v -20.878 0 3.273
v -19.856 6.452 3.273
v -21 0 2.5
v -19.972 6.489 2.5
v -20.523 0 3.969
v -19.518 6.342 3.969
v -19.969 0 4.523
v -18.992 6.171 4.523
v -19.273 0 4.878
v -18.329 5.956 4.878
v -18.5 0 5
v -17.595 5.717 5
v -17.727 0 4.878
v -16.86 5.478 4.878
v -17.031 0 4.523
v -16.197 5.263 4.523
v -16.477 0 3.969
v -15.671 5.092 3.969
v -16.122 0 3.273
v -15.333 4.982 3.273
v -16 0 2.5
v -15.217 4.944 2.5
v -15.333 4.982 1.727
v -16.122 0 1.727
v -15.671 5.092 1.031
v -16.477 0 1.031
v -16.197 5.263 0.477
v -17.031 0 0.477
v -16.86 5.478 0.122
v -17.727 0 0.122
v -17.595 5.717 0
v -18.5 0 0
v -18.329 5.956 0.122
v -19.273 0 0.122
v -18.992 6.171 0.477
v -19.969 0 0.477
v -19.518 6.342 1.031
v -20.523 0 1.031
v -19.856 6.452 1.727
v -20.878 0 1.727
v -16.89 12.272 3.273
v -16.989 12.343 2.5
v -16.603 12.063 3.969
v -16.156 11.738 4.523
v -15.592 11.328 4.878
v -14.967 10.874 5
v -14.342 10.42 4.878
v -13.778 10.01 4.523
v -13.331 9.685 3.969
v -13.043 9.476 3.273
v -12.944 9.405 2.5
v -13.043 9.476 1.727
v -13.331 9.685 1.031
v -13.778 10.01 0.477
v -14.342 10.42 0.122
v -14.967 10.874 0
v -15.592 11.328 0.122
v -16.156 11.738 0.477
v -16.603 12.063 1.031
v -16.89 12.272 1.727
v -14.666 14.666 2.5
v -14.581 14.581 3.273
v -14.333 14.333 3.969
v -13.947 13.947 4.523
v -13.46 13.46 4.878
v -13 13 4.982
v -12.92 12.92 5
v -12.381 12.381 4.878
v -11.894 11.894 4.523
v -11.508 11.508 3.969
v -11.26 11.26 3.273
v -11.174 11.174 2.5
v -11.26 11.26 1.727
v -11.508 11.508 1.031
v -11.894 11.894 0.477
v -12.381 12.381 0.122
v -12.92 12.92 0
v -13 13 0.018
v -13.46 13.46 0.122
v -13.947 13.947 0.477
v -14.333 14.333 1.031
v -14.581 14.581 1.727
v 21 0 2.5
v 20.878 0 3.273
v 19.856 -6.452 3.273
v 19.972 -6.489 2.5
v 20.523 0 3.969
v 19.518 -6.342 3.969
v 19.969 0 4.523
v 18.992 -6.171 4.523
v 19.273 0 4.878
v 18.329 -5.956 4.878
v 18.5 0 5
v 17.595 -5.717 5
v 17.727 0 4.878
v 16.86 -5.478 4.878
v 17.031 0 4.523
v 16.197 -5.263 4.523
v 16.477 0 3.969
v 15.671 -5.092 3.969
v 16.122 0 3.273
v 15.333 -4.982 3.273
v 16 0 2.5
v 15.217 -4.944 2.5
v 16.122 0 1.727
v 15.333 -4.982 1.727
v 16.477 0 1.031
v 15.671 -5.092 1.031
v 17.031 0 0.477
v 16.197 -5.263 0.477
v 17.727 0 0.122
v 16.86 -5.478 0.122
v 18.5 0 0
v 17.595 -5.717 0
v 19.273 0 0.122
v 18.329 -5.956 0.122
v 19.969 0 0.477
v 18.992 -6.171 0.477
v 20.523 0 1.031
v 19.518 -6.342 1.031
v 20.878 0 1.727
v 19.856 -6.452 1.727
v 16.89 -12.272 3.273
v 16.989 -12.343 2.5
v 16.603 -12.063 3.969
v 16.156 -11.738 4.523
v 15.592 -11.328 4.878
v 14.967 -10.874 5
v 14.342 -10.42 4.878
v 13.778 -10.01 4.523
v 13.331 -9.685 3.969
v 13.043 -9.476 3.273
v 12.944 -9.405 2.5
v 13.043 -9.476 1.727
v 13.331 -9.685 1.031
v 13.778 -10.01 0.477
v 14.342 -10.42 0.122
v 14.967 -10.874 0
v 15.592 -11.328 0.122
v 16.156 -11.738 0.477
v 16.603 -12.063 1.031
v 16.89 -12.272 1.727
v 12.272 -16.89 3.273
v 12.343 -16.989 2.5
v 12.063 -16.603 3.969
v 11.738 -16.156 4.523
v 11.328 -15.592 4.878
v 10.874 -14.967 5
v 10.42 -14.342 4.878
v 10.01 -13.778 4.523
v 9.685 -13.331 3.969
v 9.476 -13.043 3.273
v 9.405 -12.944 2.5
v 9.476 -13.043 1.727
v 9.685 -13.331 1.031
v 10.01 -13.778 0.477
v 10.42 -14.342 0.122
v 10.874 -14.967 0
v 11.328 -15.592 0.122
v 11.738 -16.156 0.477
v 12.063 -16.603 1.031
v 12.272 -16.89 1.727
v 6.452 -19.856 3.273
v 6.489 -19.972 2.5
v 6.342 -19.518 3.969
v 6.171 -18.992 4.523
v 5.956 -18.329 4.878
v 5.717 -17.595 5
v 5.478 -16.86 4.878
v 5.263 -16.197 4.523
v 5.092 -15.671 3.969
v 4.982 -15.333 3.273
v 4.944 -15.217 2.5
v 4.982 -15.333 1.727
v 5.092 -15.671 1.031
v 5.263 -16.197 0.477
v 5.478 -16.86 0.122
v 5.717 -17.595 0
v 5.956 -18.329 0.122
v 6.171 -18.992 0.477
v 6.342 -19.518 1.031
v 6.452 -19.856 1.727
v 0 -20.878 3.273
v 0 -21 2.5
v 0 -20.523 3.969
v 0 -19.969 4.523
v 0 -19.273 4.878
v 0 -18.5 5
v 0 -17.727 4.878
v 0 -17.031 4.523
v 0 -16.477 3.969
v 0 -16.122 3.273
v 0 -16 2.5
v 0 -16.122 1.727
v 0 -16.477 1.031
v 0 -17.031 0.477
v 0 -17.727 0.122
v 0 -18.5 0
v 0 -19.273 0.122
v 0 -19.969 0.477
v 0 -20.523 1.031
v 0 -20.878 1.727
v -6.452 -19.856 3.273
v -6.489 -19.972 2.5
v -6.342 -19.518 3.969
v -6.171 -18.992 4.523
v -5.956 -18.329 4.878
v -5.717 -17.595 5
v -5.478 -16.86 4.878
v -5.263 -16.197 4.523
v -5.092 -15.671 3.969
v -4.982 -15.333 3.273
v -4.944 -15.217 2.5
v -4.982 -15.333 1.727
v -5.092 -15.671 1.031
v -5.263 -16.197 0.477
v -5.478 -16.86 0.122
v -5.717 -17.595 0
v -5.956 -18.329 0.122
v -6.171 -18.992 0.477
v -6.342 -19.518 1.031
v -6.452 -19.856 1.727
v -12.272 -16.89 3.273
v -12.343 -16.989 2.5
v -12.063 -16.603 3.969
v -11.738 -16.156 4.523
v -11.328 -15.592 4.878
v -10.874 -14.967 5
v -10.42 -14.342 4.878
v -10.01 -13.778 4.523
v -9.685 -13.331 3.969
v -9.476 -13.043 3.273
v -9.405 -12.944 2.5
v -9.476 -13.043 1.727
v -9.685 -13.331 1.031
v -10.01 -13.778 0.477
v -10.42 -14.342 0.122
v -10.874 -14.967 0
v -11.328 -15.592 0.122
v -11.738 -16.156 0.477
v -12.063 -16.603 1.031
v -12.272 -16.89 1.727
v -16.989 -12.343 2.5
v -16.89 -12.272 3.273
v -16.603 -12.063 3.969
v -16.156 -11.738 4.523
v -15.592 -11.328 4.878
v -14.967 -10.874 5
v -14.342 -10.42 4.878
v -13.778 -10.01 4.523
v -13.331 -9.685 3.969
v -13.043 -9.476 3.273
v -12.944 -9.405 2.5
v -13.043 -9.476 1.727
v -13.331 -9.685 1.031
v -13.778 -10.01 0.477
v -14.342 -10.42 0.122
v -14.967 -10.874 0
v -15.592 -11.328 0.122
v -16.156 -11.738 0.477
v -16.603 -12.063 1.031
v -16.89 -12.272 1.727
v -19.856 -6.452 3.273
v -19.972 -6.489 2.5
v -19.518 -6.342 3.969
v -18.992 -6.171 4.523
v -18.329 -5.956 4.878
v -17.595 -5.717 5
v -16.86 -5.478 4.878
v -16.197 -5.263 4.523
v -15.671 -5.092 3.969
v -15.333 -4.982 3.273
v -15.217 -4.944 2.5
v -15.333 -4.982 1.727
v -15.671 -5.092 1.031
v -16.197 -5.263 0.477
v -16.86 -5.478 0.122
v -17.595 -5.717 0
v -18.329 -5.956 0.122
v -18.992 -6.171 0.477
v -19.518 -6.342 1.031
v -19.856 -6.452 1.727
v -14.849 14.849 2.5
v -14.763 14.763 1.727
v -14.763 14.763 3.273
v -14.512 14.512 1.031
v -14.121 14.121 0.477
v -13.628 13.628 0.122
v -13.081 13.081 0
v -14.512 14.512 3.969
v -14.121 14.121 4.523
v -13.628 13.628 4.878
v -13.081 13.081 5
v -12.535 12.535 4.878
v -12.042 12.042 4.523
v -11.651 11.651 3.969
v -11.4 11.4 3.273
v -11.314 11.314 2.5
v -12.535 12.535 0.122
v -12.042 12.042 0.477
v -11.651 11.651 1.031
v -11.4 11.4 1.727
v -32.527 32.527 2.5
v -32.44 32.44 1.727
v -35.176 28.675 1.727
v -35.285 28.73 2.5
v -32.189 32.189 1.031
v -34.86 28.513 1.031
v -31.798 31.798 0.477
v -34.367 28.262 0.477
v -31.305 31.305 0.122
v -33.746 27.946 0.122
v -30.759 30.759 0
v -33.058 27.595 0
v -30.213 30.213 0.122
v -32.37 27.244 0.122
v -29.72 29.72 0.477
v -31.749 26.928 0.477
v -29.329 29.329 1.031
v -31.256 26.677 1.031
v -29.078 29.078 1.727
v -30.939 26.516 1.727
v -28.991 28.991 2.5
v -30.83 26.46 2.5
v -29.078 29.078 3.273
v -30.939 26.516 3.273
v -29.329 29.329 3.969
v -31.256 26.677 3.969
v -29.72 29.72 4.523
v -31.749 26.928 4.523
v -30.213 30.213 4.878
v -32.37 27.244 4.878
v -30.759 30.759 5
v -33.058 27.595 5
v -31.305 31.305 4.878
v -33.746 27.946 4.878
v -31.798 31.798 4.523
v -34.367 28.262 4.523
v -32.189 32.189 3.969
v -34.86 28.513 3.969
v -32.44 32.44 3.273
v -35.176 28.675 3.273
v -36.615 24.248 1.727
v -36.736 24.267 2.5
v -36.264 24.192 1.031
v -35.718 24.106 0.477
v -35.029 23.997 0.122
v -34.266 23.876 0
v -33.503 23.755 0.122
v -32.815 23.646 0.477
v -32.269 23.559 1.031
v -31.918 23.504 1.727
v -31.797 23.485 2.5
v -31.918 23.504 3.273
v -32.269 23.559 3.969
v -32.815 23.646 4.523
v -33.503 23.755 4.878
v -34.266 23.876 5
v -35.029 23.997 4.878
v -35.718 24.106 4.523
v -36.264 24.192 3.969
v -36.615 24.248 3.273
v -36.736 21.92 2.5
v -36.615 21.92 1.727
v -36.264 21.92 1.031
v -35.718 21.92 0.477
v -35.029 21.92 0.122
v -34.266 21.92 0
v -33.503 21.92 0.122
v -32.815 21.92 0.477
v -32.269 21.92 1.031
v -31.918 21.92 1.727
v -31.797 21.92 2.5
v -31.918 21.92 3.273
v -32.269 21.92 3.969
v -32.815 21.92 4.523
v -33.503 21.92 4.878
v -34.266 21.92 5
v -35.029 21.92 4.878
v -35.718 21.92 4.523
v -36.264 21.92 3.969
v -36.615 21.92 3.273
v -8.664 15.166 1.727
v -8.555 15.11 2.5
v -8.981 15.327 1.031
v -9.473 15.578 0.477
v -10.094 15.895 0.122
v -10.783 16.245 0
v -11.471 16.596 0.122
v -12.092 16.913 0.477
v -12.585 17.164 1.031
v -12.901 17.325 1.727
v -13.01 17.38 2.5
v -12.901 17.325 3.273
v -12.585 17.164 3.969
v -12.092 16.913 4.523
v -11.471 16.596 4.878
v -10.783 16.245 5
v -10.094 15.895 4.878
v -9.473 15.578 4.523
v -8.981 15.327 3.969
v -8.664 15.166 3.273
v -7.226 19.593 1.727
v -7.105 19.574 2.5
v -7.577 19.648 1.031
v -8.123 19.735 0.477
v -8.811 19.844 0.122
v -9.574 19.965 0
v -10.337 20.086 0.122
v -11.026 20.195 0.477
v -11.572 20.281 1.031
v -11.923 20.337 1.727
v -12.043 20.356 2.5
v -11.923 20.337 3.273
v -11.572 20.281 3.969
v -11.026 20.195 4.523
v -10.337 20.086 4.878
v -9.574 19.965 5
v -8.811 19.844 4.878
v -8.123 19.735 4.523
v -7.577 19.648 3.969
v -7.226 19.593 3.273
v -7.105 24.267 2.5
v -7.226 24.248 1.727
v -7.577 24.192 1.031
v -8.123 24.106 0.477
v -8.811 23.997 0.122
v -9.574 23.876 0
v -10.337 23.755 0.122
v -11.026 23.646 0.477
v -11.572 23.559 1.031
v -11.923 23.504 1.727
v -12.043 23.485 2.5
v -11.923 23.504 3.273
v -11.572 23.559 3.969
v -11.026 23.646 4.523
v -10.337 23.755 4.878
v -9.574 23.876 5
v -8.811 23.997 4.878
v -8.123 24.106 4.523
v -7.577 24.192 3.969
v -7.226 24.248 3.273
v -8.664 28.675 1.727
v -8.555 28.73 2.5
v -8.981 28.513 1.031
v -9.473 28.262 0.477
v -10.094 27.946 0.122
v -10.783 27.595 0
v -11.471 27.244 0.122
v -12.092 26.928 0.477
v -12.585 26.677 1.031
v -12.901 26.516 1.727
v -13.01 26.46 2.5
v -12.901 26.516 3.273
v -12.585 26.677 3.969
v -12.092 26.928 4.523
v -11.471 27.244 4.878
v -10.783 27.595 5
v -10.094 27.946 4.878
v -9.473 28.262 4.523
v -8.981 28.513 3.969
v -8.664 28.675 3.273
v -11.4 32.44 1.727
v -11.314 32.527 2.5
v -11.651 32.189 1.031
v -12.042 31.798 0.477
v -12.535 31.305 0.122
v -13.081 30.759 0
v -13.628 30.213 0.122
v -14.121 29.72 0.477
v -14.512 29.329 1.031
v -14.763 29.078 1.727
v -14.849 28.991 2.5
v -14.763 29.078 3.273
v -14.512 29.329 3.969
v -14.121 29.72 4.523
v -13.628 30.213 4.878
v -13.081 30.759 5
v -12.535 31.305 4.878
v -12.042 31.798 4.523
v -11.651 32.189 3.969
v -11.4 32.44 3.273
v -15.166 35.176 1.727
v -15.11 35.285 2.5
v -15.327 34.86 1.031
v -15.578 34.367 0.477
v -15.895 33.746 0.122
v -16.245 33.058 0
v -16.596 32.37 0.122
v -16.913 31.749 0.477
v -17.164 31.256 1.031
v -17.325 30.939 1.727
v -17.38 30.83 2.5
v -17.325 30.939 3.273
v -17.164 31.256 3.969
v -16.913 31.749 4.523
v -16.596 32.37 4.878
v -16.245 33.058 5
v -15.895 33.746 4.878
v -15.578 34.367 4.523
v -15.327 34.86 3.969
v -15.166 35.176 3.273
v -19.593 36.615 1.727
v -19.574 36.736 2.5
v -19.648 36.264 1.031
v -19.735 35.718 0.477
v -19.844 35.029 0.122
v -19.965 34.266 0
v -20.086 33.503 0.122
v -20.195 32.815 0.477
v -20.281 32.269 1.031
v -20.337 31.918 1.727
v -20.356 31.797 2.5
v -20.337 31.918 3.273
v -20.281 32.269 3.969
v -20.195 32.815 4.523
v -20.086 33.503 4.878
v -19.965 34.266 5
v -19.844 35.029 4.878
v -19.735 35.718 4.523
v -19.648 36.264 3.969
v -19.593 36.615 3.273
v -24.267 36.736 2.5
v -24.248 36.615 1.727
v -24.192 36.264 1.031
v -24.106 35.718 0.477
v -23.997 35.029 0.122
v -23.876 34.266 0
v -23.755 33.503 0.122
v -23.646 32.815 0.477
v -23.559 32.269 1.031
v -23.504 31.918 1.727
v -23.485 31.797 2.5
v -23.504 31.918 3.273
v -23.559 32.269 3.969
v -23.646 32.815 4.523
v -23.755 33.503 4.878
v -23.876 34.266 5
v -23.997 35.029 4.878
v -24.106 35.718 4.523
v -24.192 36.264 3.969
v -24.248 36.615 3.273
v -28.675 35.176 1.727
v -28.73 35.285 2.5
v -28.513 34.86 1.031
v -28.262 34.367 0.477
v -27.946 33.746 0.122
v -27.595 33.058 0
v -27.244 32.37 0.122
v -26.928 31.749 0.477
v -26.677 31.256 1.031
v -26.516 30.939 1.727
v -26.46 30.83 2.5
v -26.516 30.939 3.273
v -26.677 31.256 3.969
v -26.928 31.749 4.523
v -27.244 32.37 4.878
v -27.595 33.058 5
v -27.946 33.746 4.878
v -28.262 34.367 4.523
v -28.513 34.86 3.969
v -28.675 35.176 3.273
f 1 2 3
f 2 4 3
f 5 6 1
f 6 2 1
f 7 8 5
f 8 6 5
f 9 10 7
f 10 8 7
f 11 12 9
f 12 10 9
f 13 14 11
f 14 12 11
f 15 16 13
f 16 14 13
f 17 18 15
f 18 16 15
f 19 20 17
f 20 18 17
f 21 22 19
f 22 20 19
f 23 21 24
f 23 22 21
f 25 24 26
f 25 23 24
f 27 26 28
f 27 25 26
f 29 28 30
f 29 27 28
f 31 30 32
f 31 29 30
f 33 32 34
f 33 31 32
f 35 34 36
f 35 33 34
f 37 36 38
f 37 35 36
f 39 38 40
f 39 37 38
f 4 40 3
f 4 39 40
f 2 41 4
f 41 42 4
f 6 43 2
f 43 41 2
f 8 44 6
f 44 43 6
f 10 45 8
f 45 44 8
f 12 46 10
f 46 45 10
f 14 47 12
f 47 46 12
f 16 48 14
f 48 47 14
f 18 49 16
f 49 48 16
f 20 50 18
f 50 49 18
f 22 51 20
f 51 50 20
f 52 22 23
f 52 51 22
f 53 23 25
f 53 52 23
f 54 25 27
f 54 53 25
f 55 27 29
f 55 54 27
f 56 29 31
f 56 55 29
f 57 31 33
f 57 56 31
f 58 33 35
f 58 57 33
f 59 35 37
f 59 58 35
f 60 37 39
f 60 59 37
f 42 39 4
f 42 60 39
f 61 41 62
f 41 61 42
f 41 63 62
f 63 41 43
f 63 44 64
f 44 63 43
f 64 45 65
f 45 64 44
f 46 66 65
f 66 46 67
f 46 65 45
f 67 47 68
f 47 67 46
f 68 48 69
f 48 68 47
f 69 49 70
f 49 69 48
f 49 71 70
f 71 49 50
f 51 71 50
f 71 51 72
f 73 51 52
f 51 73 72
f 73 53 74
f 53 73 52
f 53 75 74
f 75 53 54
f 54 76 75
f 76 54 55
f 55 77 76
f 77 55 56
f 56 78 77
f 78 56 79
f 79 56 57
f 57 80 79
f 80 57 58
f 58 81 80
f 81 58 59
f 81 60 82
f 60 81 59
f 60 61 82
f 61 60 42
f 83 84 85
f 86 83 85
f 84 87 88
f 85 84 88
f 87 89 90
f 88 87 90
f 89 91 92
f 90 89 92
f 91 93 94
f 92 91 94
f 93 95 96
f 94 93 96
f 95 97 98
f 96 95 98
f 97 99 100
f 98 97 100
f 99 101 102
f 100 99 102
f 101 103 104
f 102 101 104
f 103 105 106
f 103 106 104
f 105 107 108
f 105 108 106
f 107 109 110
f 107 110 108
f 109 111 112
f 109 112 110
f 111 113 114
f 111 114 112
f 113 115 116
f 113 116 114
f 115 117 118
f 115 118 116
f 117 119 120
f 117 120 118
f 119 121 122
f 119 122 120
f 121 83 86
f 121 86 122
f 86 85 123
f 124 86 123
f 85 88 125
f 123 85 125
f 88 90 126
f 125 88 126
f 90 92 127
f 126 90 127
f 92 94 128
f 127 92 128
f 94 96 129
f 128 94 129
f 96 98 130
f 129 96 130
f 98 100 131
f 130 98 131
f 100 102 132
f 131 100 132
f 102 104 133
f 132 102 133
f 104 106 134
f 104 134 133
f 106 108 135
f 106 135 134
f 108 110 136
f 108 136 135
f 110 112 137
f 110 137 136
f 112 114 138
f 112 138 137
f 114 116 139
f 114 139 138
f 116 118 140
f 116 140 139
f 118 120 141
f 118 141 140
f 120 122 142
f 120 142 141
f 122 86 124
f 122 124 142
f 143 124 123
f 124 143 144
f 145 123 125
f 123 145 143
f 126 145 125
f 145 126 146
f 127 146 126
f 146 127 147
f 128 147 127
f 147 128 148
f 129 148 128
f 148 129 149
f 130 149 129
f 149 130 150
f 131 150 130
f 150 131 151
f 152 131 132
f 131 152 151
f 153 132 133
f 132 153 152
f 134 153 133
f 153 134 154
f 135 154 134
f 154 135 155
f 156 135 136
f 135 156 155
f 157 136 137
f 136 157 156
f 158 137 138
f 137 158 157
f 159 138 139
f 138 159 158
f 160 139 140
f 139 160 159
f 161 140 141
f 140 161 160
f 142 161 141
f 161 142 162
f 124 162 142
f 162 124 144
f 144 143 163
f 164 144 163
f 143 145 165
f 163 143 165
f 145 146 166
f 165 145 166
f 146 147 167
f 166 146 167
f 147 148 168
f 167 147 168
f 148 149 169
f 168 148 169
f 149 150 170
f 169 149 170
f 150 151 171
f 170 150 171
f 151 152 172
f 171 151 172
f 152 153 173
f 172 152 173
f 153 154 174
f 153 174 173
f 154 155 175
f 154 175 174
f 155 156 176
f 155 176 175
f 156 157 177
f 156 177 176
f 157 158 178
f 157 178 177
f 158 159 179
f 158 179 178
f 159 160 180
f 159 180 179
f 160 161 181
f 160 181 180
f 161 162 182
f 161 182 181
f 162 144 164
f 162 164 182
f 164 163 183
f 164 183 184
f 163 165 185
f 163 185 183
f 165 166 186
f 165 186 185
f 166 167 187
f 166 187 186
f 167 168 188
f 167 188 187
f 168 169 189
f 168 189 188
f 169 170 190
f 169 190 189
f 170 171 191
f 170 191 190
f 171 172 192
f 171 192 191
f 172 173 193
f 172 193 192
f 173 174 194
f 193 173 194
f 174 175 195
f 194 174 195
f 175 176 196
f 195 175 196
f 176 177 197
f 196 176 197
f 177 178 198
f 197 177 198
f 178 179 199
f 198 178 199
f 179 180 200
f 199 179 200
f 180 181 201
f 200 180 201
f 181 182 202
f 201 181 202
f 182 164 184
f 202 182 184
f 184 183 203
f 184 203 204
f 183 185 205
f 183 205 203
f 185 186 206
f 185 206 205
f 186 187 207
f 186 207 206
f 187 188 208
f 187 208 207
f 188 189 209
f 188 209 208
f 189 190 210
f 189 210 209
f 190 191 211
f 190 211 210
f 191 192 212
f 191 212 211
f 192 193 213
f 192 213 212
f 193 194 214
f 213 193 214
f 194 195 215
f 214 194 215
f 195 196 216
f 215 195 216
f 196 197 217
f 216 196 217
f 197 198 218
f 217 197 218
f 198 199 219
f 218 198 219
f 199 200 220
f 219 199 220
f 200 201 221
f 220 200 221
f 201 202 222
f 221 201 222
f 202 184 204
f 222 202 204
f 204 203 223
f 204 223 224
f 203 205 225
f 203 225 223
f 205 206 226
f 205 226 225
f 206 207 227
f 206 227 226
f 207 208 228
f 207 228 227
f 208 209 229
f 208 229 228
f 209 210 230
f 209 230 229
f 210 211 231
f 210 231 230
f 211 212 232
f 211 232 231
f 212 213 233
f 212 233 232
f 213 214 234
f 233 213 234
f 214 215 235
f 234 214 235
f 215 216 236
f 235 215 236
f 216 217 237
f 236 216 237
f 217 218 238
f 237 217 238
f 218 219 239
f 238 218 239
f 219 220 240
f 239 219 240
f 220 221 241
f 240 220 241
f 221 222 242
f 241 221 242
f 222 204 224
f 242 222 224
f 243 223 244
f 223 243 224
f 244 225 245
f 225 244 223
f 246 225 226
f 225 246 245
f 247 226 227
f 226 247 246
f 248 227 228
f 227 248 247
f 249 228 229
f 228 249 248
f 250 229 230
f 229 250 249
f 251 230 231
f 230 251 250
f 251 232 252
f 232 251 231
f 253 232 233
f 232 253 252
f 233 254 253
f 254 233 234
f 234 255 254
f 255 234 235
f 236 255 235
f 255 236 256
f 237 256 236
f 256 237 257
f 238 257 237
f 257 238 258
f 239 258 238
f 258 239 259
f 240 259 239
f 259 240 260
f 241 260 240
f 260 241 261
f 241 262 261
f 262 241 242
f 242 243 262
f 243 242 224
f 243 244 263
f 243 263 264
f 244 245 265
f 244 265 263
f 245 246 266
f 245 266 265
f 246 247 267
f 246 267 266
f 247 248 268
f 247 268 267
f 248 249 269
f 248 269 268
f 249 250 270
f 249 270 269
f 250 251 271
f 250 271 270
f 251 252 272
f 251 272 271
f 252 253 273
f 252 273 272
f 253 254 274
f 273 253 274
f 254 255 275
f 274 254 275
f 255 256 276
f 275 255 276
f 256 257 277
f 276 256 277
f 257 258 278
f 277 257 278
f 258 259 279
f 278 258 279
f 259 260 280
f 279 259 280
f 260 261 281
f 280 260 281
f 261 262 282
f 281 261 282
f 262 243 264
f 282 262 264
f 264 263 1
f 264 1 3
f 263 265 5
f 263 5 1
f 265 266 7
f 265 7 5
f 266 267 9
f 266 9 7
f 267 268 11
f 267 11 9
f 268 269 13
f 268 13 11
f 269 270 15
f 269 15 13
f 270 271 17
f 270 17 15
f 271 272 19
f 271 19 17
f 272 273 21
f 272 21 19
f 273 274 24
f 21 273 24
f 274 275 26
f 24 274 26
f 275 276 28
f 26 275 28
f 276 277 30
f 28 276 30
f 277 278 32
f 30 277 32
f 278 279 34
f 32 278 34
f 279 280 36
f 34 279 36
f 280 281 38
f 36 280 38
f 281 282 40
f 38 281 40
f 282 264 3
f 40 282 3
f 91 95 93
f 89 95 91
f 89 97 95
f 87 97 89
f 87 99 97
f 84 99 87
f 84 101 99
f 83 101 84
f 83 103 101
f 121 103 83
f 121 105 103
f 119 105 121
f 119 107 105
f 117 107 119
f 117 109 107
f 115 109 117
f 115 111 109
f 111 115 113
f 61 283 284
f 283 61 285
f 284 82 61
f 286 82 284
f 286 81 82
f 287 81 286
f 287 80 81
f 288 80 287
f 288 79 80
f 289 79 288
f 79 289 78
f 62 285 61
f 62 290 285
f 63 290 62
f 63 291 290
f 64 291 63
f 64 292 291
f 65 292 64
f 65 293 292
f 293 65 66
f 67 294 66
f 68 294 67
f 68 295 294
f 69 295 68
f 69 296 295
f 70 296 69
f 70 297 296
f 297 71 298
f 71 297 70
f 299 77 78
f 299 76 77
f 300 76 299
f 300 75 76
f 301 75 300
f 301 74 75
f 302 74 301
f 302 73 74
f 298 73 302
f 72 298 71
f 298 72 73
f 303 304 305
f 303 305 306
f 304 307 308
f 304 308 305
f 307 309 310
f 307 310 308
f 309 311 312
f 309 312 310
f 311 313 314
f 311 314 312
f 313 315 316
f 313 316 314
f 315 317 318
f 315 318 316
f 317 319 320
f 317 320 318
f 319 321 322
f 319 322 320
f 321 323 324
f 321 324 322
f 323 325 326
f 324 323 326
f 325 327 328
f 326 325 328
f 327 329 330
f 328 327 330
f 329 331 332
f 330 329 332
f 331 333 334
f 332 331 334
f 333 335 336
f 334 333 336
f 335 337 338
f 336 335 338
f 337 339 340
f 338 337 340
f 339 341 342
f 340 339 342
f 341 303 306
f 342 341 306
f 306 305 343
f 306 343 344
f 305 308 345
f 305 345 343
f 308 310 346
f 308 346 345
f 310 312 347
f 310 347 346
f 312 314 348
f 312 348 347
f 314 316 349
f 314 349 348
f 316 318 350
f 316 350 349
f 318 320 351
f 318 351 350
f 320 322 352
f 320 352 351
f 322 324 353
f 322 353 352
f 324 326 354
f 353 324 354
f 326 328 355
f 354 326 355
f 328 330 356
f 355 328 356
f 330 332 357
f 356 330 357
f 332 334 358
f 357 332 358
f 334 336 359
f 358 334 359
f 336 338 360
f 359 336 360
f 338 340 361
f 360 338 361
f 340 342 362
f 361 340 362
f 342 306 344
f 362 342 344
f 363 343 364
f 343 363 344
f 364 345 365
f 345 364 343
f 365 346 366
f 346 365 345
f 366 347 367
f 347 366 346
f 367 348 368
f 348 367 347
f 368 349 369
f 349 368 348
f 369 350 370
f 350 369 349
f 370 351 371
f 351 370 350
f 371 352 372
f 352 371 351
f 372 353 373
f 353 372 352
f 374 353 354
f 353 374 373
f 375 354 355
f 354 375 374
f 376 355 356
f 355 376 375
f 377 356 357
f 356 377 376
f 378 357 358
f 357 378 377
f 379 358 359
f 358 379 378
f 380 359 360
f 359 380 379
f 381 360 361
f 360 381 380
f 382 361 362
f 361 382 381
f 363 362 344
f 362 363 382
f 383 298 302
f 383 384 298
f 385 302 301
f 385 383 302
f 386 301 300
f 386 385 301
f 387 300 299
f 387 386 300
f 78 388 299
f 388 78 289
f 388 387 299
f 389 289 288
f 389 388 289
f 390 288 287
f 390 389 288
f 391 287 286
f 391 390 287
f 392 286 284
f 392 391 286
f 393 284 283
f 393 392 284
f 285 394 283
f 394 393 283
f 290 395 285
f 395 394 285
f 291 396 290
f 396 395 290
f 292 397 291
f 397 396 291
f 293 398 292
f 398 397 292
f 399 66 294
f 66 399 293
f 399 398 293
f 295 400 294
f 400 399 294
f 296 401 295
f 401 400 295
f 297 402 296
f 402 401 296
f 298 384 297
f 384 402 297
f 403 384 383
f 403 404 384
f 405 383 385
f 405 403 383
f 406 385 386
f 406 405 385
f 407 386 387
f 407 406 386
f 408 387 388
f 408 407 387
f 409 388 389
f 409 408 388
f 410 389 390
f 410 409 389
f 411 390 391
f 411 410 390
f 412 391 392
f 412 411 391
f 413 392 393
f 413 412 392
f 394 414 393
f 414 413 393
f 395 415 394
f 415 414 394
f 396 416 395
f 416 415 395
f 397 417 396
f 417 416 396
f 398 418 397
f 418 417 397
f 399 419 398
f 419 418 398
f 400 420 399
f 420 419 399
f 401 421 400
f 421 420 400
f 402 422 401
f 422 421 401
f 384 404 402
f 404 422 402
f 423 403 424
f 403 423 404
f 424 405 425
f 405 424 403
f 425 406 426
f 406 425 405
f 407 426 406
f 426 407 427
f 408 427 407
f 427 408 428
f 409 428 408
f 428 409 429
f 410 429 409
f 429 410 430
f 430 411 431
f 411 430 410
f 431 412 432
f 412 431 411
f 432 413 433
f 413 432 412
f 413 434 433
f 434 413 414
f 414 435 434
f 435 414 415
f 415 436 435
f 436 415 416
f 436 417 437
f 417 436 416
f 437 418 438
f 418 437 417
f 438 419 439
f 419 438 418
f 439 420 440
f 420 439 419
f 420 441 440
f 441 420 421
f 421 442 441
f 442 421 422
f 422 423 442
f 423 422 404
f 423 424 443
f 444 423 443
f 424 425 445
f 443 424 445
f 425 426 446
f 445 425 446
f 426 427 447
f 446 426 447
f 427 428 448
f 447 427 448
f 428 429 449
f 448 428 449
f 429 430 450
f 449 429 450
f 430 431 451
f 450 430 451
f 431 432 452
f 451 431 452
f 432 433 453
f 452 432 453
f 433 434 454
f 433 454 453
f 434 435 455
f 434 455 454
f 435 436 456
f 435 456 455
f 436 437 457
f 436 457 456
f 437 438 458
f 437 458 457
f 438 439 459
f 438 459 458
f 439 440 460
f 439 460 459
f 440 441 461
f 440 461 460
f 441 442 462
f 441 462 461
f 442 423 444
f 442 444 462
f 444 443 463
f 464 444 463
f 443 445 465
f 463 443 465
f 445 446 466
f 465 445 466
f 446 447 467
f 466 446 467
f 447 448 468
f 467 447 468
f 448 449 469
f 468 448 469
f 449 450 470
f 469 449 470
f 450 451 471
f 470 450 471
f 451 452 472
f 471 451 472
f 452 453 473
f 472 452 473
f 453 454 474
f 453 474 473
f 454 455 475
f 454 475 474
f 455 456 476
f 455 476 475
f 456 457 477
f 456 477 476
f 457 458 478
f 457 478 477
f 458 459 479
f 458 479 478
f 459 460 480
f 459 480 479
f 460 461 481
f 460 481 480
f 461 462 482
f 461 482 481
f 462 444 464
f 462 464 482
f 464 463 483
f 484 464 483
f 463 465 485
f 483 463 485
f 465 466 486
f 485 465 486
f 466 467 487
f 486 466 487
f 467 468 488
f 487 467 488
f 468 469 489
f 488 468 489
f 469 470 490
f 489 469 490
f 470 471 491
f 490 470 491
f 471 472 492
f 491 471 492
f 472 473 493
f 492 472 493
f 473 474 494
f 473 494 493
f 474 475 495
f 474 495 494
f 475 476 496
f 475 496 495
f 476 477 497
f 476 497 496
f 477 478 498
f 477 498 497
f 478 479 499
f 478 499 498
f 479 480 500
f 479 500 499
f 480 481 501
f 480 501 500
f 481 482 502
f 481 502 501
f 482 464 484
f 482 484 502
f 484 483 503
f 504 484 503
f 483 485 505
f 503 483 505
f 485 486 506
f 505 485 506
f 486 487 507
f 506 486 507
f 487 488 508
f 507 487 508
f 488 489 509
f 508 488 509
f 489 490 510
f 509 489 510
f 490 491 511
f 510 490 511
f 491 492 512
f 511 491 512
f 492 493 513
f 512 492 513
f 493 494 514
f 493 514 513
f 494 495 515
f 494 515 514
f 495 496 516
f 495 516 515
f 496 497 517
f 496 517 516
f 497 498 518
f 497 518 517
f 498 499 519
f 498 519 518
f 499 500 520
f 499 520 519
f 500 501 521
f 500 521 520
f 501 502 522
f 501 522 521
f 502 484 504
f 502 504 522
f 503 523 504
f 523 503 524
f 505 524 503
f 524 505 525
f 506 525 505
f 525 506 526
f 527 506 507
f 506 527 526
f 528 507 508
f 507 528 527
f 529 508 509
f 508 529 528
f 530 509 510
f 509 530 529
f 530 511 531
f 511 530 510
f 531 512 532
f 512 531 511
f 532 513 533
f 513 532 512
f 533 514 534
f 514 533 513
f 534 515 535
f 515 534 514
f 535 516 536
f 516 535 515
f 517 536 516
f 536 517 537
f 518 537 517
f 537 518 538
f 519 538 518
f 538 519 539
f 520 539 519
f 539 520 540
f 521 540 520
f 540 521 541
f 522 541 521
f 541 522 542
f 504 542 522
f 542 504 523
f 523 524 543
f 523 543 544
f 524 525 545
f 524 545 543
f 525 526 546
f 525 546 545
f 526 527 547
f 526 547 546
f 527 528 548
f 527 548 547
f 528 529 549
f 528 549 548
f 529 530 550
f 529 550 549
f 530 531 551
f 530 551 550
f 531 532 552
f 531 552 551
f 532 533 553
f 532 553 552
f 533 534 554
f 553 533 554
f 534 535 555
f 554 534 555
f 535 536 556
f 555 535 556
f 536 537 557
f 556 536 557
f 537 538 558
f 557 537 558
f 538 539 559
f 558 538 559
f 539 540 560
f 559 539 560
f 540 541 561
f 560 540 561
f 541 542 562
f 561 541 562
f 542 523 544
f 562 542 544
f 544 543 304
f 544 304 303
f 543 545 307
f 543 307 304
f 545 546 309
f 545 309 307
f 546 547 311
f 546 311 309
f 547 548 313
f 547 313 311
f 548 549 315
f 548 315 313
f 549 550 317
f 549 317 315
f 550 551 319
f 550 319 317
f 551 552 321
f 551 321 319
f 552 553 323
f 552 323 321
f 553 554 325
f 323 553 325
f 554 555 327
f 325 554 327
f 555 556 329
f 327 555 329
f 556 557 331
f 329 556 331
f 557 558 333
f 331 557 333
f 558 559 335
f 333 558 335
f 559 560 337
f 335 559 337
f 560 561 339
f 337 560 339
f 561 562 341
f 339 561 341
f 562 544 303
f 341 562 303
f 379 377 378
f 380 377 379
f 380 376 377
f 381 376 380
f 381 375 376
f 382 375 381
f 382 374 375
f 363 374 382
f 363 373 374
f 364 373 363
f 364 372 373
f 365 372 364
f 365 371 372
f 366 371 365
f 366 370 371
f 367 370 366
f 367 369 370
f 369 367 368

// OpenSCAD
hook_1_diameter = 32 ; // [10:100]
hook_2_diameter = 20 ; // [10:100]
bar_diameter = 5 ;     // [3:12]

$fn = 20 ;	      //  [20:120]

SHook(hook_1_diameter / 2, hook_2_diameter / 2, bar_diameter) ;

module SHook(r1, r2, thick) {
    three_quarter_circle(r1, thick) ;

    translate([(r1 + r2 + thick) *  -sin(45), (r1 + r2 + thick) * sin(45), thick])
    rotate([180, 0, -45])
    three_quarter_circle(r2, thick) ;
}

module three_quarter_circle(radius, thick) {
    difference() {
        translate([0, 0, thick/2])
        rotate_extrude()
        translate([radius + thick/2, 0, 0])
        circle(r=thick/2) ;

        translate([0, 0, -1])
        cube([radius + thick + 1, radius + thick + 1, thick + 2]) ;

        rotate([0, 0, 45])
        translate([0, 0, -1])
        cube([radius + thick + 1, radius + thick + 1, thick + 2]) ;
    }
}
